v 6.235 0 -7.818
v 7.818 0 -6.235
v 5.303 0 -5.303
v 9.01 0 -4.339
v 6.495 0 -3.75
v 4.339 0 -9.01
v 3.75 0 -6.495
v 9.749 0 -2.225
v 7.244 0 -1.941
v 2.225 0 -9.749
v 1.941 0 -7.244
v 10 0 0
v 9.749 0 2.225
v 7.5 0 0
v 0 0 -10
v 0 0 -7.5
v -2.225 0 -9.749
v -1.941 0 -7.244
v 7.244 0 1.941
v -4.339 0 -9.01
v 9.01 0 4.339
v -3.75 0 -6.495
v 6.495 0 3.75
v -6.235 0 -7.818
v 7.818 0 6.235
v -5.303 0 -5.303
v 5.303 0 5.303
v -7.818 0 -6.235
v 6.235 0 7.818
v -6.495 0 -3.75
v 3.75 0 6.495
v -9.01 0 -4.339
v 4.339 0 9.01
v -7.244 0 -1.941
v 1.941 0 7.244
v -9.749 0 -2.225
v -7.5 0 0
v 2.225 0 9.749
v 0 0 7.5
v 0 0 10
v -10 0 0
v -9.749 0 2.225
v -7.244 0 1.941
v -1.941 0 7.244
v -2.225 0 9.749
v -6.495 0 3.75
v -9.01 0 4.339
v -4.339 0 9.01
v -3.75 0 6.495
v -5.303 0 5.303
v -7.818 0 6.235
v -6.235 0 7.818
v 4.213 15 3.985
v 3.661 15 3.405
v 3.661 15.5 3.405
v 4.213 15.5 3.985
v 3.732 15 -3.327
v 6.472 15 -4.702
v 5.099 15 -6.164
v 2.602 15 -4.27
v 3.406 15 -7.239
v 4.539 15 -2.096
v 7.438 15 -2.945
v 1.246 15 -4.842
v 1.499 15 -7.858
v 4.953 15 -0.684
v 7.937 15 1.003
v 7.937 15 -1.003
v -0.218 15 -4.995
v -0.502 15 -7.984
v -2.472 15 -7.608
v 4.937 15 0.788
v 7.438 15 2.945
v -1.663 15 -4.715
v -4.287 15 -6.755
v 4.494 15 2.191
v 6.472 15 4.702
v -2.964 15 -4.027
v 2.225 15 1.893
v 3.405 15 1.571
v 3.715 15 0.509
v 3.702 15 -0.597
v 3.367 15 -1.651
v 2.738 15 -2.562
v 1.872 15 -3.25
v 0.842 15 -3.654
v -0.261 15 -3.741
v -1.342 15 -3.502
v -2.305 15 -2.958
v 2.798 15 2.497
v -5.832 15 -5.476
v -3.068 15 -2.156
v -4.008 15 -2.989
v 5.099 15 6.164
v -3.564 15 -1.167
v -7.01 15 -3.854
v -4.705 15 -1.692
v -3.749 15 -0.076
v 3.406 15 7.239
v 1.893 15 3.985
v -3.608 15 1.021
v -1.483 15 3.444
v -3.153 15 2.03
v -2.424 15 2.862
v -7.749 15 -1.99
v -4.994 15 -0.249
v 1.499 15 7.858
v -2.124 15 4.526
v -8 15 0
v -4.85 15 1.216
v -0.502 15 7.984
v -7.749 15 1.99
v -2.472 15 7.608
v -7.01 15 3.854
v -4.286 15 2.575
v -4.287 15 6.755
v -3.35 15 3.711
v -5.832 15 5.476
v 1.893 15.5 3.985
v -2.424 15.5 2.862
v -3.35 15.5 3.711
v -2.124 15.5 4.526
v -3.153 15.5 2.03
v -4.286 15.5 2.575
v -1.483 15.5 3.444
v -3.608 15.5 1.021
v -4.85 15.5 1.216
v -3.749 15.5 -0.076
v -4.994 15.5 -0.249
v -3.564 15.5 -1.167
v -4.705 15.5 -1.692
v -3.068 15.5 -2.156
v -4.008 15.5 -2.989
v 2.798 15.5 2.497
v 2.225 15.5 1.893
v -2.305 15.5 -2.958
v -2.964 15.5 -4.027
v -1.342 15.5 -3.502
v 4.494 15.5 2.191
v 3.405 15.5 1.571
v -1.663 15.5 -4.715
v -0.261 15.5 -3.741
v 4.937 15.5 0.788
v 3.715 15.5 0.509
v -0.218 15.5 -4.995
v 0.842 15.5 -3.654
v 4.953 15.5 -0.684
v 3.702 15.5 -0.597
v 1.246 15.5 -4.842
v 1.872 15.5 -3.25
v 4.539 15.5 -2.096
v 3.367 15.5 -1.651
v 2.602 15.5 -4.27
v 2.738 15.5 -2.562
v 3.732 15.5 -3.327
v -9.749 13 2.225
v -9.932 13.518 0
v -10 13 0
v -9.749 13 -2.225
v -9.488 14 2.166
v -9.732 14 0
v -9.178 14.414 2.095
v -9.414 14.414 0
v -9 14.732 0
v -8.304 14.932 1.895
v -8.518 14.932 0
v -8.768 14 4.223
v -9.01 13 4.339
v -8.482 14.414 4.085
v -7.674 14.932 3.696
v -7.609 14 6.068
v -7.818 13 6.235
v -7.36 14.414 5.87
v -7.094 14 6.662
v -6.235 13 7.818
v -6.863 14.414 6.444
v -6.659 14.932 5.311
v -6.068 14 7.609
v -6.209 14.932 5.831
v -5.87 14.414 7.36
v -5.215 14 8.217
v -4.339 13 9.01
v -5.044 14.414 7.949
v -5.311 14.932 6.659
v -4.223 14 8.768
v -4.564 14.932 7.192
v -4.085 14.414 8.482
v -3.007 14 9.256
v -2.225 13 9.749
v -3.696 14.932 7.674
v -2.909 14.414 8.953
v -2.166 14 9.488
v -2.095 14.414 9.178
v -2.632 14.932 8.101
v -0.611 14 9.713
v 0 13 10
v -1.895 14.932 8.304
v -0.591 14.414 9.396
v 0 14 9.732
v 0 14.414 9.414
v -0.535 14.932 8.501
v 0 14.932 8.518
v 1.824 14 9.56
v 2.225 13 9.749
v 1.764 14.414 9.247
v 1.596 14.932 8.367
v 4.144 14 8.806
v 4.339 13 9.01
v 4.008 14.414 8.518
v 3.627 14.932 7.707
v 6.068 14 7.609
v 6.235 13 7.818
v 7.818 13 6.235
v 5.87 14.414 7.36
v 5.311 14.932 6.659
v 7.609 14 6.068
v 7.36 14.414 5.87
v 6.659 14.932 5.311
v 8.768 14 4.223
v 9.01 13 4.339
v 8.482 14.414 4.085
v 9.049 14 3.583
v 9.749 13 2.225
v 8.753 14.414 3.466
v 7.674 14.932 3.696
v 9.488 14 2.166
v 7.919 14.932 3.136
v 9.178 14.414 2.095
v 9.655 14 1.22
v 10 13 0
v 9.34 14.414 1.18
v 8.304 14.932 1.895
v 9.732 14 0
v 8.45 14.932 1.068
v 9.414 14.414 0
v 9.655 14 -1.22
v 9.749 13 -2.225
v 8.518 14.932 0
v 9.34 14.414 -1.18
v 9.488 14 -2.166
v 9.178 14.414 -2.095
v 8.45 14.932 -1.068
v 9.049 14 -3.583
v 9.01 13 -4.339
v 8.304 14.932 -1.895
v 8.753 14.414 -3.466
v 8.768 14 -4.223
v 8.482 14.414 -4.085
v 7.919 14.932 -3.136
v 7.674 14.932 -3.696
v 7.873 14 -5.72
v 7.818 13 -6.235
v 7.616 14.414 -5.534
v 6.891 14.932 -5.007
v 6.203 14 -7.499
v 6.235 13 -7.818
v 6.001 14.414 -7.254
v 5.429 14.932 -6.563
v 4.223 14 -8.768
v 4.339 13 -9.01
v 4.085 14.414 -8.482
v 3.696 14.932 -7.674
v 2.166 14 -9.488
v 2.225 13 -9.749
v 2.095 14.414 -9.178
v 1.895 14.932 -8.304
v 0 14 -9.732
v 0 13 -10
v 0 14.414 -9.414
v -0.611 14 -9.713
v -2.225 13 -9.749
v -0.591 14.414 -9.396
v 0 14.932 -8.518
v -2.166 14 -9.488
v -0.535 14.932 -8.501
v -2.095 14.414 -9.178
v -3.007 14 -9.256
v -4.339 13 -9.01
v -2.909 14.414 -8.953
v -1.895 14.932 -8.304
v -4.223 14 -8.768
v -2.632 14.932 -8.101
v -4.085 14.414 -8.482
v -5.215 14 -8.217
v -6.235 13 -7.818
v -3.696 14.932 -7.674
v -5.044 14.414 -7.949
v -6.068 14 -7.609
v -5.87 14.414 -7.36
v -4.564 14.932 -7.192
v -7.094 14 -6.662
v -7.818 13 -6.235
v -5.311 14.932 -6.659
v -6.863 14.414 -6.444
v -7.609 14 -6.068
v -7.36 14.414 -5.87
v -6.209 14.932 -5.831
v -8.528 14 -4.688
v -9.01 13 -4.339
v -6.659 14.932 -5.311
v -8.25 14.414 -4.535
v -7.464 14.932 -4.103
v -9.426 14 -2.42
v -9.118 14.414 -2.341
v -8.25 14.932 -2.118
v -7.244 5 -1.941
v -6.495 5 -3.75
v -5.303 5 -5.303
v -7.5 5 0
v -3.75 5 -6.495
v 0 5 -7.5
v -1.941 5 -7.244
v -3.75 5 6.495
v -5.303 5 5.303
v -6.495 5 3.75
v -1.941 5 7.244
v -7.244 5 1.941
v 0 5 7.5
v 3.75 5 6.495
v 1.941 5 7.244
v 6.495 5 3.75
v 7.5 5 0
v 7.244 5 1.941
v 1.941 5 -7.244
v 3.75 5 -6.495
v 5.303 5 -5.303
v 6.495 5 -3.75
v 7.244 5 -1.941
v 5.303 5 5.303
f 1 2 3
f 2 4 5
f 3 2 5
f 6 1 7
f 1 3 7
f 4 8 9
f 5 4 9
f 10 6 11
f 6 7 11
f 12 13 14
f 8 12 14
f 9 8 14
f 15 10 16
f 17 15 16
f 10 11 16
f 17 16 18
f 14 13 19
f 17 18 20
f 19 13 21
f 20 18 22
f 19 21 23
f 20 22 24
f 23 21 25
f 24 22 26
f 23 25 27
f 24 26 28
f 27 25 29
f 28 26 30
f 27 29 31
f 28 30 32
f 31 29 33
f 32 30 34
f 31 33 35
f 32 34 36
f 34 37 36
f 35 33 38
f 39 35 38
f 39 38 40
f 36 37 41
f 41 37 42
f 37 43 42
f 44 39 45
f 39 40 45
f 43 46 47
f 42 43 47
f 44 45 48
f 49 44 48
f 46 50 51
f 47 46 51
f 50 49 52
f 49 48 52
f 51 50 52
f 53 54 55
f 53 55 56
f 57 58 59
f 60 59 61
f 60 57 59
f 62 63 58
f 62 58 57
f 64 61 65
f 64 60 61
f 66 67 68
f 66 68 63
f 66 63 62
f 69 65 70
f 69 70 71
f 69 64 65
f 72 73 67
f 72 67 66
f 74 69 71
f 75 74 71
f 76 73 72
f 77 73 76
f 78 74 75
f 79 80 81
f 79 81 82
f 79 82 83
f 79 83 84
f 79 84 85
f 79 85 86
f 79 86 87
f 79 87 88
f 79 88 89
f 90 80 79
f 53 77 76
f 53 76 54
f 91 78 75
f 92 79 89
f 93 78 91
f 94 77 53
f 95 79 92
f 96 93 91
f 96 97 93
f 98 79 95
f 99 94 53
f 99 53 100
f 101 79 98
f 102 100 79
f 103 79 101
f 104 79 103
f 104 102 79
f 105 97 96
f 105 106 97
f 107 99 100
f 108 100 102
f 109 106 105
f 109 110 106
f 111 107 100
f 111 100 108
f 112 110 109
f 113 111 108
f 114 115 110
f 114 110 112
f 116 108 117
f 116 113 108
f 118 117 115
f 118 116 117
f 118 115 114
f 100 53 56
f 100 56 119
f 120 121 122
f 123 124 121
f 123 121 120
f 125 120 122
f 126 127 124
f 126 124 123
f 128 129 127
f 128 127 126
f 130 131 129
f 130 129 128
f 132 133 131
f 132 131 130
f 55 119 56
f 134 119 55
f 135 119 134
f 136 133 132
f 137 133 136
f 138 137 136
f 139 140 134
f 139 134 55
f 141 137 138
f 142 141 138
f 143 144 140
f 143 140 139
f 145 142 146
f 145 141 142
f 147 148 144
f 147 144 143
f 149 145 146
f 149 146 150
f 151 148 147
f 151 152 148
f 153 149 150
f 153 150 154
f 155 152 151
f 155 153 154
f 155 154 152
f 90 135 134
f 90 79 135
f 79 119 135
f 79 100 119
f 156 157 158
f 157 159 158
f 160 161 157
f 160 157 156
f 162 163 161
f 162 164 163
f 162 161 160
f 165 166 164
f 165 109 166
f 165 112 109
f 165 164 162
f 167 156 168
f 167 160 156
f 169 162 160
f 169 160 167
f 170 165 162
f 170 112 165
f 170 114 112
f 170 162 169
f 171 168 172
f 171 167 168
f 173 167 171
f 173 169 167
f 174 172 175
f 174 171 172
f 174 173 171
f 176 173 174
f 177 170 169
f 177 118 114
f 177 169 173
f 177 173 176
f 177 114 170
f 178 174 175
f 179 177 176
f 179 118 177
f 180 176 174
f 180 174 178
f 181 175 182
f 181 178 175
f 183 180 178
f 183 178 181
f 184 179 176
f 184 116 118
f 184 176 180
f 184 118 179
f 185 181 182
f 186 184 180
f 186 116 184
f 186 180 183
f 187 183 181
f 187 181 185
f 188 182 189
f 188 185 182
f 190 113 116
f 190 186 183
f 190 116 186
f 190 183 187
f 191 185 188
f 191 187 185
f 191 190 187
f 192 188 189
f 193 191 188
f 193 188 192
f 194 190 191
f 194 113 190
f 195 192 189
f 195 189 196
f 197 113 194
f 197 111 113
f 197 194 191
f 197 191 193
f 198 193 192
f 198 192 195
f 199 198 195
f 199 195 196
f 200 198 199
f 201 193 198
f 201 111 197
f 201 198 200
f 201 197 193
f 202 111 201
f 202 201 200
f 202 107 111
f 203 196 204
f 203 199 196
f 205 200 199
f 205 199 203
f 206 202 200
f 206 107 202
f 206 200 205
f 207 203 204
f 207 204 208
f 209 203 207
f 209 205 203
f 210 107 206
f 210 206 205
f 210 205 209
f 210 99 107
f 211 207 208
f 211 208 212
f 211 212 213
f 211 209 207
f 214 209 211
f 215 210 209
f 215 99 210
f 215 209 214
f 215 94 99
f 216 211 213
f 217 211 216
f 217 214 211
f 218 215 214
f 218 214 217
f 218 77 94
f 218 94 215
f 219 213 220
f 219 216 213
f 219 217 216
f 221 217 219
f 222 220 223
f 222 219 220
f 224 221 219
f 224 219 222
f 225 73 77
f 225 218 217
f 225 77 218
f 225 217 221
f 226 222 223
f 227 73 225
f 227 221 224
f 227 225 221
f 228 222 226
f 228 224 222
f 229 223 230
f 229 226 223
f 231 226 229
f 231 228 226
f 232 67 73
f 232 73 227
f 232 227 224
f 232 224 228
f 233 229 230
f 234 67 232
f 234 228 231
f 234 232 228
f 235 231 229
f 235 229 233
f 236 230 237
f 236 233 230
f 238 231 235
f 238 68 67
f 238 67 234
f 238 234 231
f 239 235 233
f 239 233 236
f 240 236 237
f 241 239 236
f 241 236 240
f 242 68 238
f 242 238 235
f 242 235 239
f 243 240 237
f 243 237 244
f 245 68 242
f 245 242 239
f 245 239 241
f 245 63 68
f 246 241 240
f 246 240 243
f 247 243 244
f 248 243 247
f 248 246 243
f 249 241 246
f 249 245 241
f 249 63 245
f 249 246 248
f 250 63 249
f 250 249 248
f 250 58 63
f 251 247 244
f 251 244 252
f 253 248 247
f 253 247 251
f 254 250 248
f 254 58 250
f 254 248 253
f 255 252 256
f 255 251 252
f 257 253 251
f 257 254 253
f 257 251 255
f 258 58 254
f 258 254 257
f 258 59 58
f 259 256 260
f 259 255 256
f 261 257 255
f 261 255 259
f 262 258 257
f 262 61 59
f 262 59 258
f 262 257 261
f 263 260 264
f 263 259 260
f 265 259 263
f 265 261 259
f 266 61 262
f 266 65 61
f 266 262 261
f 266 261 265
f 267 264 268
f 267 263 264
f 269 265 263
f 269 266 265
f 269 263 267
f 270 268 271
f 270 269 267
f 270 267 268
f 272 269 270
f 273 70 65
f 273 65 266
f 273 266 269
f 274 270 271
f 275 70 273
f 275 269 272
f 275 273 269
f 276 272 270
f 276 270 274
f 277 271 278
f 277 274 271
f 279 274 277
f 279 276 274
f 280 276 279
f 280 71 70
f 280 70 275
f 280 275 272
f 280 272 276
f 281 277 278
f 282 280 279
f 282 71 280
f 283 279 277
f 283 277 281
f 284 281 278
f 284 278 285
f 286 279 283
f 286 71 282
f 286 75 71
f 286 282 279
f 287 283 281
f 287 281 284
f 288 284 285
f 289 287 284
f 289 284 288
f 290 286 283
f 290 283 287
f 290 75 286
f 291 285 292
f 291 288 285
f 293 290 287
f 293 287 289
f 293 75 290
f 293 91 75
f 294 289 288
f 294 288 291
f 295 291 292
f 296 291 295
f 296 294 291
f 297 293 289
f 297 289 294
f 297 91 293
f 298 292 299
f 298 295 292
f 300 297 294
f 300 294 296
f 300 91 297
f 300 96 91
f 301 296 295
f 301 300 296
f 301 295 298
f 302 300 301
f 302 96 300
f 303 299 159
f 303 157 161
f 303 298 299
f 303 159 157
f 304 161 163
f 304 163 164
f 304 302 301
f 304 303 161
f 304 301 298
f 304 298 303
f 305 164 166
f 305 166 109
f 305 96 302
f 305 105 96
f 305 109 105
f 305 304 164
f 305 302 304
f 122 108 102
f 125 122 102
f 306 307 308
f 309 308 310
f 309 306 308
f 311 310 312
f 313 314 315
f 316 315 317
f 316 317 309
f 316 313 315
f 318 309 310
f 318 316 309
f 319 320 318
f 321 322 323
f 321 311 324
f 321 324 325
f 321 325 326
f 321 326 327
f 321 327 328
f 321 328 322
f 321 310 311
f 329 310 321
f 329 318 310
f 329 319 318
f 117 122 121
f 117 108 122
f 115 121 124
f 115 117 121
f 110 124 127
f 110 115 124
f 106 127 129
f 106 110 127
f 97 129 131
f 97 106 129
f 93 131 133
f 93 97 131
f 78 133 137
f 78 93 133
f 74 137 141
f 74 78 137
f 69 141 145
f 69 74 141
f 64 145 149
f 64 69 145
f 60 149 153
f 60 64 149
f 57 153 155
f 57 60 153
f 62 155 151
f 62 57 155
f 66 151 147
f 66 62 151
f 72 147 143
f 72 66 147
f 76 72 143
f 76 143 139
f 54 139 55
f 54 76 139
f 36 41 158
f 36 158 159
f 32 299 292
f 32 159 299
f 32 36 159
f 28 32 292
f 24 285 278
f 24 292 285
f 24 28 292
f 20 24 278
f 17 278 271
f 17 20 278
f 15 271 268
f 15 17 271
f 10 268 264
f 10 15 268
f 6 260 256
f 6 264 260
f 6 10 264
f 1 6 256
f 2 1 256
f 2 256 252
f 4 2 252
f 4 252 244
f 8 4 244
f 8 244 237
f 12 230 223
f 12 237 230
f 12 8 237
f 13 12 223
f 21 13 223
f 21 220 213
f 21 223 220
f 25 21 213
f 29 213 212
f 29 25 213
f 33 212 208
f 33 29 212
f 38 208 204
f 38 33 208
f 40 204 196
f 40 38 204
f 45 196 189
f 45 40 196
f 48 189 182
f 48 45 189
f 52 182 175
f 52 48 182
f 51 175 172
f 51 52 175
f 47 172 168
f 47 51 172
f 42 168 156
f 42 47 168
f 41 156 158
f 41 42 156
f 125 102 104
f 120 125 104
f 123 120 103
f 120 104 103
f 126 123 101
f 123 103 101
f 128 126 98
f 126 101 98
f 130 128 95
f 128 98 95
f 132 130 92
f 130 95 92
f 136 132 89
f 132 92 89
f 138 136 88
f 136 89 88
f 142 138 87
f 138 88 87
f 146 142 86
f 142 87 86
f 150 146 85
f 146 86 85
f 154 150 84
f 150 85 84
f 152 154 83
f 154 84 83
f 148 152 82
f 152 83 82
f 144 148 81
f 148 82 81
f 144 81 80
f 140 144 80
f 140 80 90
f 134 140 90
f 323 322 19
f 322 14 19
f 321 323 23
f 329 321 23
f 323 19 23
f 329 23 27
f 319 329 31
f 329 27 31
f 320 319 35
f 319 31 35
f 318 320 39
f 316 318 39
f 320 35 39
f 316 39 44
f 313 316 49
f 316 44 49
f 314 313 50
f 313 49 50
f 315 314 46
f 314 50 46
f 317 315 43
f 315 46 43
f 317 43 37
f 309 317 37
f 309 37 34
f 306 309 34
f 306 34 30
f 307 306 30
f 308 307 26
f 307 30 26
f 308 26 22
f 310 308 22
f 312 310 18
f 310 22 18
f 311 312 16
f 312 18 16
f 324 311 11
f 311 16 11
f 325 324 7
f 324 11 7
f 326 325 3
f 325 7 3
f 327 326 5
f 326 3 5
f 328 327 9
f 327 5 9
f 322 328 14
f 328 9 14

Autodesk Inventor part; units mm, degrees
ref_plane "YZ Plane" through (0, 0, 0) normal (1, 0, 0) x (0, 1, 0)
ref_plane "XZ Plane" through (0, 0, 0) normal (0, 1, 0) x (-1, 0, 0)
ref_plane "XY Plane" through (0, 0, 0) normal (0, 0, 1) x (1, 0, 0)
sketch "Sketch1" plane through (0, 0, 0) normal (0, 1, 0) x (-1, 0, 0)
  circle A0 centre (0, 0) radius 10
  dimension "d0" = 20
extrude "Extrusion1" add sketch "Sketch1" along normal blind 15
sketch "Sketch2" plane through (0, 0, 0) normal (0, -1, 0) x (1, 0, 0)
  circle A0 centre (0, 0) radius 7.5
  dimension "d3" = 15
extrude "Extrusion2" cut sketch "Sketch2" against normal blind 5
fillet "Fillet1" radius 2 1 edges at (10, 15, 0)
sketch "Sketch4" plane through (0, 15, 0) normal (0, 1, 0) x (1, 0, 0)
  arc A0 (2.7981, -2.4967) -> (-1.483, -3.4443) centre (0, 0) ccw
  arc A1 (3.6613, -3.4051) -> (-2.1245, -4.5262) centre (0, 0) ccw
  line L0 (-2.1245, -4.5262) -> (-1.483, -3.4443)
  line L1 (1.8934, -3.9852) -> (2.2247, -1.8934)
  line L2 (4.2127, -3.9852) -> (1.8934, -3.9852)
  line L3 (2.2247, -1.8934) -> (2.7981, -2.4967)
  line L4 (3.6613, -3.4051) -> (4.2127, -3.9852)
  dimension "d12" = 7.5
  dimension "d13" = 10
extrude "Extrusion4" add sketch "Sketch4" along normal blind 0.5
properties part number "Device Rotation Button"
